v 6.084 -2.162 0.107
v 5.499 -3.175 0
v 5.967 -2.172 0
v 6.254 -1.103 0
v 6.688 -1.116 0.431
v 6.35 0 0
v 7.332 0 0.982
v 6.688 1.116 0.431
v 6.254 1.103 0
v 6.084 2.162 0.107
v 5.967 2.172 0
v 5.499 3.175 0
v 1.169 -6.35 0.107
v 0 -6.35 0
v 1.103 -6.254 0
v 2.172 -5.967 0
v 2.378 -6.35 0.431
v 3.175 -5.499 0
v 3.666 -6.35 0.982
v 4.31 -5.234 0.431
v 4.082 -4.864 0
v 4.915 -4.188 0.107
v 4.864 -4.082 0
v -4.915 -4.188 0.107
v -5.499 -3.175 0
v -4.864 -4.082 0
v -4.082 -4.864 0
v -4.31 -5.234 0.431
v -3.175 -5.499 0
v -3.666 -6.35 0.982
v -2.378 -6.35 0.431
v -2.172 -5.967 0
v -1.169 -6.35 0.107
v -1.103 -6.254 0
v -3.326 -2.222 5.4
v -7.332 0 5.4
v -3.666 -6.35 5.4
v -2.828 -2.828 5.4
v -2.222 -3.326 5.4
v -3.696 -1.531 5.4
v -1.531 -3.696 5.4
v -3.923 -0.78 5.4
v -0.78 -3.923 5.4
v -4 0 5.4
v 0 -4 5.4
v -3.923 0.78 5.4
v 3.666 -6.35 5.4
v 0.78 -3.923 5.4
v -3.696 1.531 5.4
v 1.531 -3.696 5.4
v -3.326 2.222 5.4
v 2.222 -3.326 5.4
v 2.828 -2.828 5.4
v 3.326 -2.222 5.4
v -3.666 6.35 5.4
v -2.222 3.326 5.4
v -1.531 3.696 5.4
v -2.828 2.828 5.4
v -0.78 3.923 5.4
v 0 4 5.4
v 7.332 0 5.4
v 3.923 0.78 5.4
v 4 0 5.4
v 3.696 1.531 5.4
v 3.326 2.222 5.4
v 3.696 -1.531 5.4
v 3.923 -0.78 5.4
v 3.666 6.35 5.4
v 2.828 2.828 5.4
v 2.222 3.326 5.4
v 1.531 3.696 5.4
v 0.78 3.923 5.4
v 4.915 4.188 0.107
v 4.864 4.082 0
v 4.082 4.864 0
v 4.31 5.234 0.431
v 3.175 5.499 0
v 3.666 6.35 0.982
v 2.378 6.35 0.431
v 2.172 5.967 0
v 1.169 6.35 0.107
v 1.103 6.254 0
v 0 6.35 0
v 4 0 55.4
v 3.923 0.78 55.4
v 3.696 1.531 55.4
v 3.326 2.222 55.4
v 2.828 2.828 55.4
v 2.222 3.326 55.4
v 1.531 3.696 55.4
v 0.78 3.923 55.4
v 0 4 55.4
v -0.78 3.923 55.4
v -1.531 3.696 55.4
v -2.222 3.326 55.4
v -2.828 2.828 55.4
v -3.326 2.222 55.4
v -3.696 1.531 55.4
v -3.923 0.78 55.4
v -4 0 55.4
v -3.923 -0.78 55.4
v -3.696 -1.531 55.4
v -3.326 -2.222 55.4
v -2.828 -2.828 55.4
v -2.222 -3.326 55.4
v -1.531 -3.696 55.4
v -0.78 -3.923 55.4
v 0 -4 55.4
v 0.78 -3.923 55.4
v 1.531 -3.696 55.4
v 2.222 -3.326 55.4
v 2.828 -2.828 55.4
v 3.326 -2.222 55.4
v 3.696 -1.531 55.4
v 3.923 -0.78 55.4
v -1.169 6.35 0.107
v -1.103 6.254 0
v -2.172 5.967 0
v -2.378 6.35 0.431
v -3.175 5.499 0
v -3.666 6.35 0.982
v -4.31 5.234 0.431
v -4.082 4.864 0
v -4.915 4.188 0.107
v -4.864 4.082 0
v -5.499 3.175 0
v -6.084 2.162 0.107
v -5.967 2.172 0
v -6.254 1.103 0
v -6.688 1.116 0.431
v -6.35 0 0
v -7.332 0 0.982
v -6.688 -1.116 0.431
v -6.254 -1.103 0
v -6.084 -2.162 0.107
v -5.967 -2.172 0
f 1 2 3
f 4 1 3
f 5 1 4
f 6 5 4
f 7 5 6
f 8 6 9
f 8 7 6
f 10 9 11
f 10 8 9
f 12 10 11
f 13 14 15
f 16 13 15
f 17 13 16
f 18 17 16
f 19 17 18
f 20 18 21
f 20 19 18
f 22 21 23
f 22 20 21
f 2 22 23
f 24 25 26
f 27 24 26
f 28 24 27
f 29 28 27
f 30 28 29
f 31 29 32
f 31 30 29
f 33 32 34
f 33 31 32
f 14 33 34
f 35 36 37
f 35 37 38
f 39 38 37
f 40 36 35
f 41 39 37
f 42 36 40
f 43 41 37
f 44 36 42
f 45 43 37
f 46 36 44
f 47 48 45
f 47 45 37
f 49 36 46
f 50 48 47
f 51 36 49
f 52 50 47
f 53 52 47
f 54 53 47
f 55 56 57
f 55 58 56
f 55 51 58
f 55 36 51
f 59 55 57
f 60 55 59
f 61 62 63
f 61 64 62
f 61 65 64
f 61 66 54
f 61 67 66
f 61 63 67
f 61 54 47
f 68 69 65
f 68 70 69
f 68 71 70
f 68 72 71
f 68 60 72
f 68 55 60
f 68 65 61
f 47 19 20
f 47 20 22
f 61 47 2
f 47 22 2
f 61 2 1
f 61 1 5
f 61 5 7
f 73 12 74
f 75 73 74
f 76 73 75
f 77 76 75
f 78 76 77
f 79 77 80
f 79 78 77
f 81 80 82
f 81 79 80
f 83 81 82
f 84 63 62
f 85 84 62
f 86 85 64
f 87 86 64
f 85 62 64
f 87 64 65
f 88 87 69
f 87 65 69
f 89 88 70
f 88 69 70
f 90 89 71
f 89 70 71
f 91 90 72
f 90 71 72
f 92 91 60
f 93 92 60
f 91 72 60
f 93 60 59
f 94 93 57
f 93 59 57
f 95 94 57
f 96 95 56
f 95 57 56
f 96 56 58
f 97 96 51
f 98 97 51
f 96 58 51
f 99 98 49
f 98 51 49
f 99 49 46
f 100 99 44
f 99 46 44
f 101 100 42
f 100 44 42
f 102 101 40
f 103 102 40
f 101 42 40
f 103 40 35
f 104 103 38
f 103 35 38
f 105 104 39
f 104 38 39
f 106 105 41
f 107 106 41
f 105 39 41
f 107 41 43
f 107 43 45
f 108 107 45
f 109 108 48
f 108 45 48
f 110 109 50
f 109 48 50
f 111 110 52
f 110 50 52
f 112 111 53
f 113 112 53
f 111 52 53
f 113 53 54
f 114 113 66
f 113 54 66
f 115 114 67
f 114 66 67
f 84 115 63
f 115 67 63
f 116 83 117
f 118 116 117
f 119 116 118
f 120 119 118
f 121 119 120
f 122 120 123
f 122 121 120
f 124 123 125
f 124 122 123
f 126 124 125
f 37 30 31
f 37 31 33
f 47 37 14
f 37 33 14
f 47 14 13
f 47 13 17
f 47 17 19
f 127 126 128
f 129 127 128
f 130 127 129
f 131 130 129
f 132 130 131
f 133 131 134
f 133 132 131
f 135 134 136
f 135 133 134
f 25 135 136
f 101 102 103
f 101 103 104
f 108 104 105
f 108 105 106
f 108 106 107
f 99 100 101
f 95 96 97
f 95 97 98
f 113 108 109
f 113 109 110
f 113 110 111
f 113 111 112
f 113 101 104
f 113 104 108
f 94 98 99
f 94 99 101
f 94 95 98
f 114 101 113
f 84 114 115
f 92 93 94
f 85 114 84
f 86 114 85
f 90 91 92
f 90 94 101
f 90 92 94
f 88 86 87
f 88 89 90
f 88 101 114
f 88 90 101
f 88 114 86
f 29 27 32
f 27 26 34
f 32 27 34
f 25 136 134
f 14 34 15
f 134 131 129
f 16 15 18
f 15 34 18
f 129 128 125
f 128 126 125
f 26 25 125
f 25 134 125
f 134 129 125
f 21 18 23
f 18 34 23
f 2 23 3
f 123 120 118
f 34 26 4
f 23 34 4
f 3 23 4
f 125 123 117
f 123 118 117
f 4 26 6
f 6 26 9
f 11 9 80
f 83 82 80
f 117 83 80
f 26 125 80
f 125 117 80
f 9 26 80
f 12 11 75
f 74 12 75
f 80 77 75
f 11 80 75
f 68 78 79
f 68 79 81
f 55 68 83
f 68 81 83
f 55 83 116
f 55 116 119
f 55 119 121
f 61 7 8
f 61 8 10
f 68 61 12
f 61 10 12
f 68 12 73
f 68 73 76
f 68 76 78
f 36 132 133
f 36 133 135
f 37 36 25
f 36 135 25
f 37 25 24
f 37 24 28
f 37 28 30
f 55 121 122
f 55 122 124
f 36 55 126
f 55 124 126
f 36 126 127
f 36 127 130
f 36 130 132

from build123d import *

# Parameters (mm, degrees)
RESSALTO_EXTRUS_O1_DEPTH = 5.4
ESBO_O2_R                = 4
RESSALTO_EXTRUS_O2_DEPTH = 50
ESBO_O3_OUTSIDE_W        = 158.404
ESBO_O3_OUTSIDE_H        = 156.44
ESBO_O3_OUTSIDE_R        = 6.35
CORTE_EXTRUS_O1_DEPTH    = 65
CORTE_EXTRUS_O1_TAPER    = 45


with BuildPart() as part:
    # Esboço1 → Ressalto-extrusão1 (new body)
    with BuildSketch(Plane.XY):
        Polygon((3.666174209, -6.35), (7.332348419, 0), (3.666174209, 6.35), (-3.666174209, 6.35), (-7.332348419, 0), (-3.666174209, -6.35), align=None)
    extrude(amount=RESSALTO_EXTRUS_O1_DEPTH)

    # Esboço2 → Ressalto-extrusão2 (add)
    with BuildSketch(Plane.XY.offset(5.4)):
        Circle(ESBO_O2_R)
    extrude(amount=RESSALTO_EXTRUS_O2_DEPTH)

    # Esboço3 outside → Corte-extrusão1 (cut)
    with BuildSketch(Plane(origin=(0, 0, 0), x_dir=(-1, 0, 0), z_dir=(0, 0, -1))):
        Rectangle(ESBO_O3_OUTSIDE_W, ESBO_O3_OUTSIDE_H)
        Circle(ESBO_O3_OUTSIDE_R, mode=Mode.SUBTRACT)
    extrude(amount=-CORTE_EXTRUS_O1_DEPTH, taper=CORTE_EXTRUS_O1_TAPER, mode=Mode.SUBTRACT)


solid = part.part
